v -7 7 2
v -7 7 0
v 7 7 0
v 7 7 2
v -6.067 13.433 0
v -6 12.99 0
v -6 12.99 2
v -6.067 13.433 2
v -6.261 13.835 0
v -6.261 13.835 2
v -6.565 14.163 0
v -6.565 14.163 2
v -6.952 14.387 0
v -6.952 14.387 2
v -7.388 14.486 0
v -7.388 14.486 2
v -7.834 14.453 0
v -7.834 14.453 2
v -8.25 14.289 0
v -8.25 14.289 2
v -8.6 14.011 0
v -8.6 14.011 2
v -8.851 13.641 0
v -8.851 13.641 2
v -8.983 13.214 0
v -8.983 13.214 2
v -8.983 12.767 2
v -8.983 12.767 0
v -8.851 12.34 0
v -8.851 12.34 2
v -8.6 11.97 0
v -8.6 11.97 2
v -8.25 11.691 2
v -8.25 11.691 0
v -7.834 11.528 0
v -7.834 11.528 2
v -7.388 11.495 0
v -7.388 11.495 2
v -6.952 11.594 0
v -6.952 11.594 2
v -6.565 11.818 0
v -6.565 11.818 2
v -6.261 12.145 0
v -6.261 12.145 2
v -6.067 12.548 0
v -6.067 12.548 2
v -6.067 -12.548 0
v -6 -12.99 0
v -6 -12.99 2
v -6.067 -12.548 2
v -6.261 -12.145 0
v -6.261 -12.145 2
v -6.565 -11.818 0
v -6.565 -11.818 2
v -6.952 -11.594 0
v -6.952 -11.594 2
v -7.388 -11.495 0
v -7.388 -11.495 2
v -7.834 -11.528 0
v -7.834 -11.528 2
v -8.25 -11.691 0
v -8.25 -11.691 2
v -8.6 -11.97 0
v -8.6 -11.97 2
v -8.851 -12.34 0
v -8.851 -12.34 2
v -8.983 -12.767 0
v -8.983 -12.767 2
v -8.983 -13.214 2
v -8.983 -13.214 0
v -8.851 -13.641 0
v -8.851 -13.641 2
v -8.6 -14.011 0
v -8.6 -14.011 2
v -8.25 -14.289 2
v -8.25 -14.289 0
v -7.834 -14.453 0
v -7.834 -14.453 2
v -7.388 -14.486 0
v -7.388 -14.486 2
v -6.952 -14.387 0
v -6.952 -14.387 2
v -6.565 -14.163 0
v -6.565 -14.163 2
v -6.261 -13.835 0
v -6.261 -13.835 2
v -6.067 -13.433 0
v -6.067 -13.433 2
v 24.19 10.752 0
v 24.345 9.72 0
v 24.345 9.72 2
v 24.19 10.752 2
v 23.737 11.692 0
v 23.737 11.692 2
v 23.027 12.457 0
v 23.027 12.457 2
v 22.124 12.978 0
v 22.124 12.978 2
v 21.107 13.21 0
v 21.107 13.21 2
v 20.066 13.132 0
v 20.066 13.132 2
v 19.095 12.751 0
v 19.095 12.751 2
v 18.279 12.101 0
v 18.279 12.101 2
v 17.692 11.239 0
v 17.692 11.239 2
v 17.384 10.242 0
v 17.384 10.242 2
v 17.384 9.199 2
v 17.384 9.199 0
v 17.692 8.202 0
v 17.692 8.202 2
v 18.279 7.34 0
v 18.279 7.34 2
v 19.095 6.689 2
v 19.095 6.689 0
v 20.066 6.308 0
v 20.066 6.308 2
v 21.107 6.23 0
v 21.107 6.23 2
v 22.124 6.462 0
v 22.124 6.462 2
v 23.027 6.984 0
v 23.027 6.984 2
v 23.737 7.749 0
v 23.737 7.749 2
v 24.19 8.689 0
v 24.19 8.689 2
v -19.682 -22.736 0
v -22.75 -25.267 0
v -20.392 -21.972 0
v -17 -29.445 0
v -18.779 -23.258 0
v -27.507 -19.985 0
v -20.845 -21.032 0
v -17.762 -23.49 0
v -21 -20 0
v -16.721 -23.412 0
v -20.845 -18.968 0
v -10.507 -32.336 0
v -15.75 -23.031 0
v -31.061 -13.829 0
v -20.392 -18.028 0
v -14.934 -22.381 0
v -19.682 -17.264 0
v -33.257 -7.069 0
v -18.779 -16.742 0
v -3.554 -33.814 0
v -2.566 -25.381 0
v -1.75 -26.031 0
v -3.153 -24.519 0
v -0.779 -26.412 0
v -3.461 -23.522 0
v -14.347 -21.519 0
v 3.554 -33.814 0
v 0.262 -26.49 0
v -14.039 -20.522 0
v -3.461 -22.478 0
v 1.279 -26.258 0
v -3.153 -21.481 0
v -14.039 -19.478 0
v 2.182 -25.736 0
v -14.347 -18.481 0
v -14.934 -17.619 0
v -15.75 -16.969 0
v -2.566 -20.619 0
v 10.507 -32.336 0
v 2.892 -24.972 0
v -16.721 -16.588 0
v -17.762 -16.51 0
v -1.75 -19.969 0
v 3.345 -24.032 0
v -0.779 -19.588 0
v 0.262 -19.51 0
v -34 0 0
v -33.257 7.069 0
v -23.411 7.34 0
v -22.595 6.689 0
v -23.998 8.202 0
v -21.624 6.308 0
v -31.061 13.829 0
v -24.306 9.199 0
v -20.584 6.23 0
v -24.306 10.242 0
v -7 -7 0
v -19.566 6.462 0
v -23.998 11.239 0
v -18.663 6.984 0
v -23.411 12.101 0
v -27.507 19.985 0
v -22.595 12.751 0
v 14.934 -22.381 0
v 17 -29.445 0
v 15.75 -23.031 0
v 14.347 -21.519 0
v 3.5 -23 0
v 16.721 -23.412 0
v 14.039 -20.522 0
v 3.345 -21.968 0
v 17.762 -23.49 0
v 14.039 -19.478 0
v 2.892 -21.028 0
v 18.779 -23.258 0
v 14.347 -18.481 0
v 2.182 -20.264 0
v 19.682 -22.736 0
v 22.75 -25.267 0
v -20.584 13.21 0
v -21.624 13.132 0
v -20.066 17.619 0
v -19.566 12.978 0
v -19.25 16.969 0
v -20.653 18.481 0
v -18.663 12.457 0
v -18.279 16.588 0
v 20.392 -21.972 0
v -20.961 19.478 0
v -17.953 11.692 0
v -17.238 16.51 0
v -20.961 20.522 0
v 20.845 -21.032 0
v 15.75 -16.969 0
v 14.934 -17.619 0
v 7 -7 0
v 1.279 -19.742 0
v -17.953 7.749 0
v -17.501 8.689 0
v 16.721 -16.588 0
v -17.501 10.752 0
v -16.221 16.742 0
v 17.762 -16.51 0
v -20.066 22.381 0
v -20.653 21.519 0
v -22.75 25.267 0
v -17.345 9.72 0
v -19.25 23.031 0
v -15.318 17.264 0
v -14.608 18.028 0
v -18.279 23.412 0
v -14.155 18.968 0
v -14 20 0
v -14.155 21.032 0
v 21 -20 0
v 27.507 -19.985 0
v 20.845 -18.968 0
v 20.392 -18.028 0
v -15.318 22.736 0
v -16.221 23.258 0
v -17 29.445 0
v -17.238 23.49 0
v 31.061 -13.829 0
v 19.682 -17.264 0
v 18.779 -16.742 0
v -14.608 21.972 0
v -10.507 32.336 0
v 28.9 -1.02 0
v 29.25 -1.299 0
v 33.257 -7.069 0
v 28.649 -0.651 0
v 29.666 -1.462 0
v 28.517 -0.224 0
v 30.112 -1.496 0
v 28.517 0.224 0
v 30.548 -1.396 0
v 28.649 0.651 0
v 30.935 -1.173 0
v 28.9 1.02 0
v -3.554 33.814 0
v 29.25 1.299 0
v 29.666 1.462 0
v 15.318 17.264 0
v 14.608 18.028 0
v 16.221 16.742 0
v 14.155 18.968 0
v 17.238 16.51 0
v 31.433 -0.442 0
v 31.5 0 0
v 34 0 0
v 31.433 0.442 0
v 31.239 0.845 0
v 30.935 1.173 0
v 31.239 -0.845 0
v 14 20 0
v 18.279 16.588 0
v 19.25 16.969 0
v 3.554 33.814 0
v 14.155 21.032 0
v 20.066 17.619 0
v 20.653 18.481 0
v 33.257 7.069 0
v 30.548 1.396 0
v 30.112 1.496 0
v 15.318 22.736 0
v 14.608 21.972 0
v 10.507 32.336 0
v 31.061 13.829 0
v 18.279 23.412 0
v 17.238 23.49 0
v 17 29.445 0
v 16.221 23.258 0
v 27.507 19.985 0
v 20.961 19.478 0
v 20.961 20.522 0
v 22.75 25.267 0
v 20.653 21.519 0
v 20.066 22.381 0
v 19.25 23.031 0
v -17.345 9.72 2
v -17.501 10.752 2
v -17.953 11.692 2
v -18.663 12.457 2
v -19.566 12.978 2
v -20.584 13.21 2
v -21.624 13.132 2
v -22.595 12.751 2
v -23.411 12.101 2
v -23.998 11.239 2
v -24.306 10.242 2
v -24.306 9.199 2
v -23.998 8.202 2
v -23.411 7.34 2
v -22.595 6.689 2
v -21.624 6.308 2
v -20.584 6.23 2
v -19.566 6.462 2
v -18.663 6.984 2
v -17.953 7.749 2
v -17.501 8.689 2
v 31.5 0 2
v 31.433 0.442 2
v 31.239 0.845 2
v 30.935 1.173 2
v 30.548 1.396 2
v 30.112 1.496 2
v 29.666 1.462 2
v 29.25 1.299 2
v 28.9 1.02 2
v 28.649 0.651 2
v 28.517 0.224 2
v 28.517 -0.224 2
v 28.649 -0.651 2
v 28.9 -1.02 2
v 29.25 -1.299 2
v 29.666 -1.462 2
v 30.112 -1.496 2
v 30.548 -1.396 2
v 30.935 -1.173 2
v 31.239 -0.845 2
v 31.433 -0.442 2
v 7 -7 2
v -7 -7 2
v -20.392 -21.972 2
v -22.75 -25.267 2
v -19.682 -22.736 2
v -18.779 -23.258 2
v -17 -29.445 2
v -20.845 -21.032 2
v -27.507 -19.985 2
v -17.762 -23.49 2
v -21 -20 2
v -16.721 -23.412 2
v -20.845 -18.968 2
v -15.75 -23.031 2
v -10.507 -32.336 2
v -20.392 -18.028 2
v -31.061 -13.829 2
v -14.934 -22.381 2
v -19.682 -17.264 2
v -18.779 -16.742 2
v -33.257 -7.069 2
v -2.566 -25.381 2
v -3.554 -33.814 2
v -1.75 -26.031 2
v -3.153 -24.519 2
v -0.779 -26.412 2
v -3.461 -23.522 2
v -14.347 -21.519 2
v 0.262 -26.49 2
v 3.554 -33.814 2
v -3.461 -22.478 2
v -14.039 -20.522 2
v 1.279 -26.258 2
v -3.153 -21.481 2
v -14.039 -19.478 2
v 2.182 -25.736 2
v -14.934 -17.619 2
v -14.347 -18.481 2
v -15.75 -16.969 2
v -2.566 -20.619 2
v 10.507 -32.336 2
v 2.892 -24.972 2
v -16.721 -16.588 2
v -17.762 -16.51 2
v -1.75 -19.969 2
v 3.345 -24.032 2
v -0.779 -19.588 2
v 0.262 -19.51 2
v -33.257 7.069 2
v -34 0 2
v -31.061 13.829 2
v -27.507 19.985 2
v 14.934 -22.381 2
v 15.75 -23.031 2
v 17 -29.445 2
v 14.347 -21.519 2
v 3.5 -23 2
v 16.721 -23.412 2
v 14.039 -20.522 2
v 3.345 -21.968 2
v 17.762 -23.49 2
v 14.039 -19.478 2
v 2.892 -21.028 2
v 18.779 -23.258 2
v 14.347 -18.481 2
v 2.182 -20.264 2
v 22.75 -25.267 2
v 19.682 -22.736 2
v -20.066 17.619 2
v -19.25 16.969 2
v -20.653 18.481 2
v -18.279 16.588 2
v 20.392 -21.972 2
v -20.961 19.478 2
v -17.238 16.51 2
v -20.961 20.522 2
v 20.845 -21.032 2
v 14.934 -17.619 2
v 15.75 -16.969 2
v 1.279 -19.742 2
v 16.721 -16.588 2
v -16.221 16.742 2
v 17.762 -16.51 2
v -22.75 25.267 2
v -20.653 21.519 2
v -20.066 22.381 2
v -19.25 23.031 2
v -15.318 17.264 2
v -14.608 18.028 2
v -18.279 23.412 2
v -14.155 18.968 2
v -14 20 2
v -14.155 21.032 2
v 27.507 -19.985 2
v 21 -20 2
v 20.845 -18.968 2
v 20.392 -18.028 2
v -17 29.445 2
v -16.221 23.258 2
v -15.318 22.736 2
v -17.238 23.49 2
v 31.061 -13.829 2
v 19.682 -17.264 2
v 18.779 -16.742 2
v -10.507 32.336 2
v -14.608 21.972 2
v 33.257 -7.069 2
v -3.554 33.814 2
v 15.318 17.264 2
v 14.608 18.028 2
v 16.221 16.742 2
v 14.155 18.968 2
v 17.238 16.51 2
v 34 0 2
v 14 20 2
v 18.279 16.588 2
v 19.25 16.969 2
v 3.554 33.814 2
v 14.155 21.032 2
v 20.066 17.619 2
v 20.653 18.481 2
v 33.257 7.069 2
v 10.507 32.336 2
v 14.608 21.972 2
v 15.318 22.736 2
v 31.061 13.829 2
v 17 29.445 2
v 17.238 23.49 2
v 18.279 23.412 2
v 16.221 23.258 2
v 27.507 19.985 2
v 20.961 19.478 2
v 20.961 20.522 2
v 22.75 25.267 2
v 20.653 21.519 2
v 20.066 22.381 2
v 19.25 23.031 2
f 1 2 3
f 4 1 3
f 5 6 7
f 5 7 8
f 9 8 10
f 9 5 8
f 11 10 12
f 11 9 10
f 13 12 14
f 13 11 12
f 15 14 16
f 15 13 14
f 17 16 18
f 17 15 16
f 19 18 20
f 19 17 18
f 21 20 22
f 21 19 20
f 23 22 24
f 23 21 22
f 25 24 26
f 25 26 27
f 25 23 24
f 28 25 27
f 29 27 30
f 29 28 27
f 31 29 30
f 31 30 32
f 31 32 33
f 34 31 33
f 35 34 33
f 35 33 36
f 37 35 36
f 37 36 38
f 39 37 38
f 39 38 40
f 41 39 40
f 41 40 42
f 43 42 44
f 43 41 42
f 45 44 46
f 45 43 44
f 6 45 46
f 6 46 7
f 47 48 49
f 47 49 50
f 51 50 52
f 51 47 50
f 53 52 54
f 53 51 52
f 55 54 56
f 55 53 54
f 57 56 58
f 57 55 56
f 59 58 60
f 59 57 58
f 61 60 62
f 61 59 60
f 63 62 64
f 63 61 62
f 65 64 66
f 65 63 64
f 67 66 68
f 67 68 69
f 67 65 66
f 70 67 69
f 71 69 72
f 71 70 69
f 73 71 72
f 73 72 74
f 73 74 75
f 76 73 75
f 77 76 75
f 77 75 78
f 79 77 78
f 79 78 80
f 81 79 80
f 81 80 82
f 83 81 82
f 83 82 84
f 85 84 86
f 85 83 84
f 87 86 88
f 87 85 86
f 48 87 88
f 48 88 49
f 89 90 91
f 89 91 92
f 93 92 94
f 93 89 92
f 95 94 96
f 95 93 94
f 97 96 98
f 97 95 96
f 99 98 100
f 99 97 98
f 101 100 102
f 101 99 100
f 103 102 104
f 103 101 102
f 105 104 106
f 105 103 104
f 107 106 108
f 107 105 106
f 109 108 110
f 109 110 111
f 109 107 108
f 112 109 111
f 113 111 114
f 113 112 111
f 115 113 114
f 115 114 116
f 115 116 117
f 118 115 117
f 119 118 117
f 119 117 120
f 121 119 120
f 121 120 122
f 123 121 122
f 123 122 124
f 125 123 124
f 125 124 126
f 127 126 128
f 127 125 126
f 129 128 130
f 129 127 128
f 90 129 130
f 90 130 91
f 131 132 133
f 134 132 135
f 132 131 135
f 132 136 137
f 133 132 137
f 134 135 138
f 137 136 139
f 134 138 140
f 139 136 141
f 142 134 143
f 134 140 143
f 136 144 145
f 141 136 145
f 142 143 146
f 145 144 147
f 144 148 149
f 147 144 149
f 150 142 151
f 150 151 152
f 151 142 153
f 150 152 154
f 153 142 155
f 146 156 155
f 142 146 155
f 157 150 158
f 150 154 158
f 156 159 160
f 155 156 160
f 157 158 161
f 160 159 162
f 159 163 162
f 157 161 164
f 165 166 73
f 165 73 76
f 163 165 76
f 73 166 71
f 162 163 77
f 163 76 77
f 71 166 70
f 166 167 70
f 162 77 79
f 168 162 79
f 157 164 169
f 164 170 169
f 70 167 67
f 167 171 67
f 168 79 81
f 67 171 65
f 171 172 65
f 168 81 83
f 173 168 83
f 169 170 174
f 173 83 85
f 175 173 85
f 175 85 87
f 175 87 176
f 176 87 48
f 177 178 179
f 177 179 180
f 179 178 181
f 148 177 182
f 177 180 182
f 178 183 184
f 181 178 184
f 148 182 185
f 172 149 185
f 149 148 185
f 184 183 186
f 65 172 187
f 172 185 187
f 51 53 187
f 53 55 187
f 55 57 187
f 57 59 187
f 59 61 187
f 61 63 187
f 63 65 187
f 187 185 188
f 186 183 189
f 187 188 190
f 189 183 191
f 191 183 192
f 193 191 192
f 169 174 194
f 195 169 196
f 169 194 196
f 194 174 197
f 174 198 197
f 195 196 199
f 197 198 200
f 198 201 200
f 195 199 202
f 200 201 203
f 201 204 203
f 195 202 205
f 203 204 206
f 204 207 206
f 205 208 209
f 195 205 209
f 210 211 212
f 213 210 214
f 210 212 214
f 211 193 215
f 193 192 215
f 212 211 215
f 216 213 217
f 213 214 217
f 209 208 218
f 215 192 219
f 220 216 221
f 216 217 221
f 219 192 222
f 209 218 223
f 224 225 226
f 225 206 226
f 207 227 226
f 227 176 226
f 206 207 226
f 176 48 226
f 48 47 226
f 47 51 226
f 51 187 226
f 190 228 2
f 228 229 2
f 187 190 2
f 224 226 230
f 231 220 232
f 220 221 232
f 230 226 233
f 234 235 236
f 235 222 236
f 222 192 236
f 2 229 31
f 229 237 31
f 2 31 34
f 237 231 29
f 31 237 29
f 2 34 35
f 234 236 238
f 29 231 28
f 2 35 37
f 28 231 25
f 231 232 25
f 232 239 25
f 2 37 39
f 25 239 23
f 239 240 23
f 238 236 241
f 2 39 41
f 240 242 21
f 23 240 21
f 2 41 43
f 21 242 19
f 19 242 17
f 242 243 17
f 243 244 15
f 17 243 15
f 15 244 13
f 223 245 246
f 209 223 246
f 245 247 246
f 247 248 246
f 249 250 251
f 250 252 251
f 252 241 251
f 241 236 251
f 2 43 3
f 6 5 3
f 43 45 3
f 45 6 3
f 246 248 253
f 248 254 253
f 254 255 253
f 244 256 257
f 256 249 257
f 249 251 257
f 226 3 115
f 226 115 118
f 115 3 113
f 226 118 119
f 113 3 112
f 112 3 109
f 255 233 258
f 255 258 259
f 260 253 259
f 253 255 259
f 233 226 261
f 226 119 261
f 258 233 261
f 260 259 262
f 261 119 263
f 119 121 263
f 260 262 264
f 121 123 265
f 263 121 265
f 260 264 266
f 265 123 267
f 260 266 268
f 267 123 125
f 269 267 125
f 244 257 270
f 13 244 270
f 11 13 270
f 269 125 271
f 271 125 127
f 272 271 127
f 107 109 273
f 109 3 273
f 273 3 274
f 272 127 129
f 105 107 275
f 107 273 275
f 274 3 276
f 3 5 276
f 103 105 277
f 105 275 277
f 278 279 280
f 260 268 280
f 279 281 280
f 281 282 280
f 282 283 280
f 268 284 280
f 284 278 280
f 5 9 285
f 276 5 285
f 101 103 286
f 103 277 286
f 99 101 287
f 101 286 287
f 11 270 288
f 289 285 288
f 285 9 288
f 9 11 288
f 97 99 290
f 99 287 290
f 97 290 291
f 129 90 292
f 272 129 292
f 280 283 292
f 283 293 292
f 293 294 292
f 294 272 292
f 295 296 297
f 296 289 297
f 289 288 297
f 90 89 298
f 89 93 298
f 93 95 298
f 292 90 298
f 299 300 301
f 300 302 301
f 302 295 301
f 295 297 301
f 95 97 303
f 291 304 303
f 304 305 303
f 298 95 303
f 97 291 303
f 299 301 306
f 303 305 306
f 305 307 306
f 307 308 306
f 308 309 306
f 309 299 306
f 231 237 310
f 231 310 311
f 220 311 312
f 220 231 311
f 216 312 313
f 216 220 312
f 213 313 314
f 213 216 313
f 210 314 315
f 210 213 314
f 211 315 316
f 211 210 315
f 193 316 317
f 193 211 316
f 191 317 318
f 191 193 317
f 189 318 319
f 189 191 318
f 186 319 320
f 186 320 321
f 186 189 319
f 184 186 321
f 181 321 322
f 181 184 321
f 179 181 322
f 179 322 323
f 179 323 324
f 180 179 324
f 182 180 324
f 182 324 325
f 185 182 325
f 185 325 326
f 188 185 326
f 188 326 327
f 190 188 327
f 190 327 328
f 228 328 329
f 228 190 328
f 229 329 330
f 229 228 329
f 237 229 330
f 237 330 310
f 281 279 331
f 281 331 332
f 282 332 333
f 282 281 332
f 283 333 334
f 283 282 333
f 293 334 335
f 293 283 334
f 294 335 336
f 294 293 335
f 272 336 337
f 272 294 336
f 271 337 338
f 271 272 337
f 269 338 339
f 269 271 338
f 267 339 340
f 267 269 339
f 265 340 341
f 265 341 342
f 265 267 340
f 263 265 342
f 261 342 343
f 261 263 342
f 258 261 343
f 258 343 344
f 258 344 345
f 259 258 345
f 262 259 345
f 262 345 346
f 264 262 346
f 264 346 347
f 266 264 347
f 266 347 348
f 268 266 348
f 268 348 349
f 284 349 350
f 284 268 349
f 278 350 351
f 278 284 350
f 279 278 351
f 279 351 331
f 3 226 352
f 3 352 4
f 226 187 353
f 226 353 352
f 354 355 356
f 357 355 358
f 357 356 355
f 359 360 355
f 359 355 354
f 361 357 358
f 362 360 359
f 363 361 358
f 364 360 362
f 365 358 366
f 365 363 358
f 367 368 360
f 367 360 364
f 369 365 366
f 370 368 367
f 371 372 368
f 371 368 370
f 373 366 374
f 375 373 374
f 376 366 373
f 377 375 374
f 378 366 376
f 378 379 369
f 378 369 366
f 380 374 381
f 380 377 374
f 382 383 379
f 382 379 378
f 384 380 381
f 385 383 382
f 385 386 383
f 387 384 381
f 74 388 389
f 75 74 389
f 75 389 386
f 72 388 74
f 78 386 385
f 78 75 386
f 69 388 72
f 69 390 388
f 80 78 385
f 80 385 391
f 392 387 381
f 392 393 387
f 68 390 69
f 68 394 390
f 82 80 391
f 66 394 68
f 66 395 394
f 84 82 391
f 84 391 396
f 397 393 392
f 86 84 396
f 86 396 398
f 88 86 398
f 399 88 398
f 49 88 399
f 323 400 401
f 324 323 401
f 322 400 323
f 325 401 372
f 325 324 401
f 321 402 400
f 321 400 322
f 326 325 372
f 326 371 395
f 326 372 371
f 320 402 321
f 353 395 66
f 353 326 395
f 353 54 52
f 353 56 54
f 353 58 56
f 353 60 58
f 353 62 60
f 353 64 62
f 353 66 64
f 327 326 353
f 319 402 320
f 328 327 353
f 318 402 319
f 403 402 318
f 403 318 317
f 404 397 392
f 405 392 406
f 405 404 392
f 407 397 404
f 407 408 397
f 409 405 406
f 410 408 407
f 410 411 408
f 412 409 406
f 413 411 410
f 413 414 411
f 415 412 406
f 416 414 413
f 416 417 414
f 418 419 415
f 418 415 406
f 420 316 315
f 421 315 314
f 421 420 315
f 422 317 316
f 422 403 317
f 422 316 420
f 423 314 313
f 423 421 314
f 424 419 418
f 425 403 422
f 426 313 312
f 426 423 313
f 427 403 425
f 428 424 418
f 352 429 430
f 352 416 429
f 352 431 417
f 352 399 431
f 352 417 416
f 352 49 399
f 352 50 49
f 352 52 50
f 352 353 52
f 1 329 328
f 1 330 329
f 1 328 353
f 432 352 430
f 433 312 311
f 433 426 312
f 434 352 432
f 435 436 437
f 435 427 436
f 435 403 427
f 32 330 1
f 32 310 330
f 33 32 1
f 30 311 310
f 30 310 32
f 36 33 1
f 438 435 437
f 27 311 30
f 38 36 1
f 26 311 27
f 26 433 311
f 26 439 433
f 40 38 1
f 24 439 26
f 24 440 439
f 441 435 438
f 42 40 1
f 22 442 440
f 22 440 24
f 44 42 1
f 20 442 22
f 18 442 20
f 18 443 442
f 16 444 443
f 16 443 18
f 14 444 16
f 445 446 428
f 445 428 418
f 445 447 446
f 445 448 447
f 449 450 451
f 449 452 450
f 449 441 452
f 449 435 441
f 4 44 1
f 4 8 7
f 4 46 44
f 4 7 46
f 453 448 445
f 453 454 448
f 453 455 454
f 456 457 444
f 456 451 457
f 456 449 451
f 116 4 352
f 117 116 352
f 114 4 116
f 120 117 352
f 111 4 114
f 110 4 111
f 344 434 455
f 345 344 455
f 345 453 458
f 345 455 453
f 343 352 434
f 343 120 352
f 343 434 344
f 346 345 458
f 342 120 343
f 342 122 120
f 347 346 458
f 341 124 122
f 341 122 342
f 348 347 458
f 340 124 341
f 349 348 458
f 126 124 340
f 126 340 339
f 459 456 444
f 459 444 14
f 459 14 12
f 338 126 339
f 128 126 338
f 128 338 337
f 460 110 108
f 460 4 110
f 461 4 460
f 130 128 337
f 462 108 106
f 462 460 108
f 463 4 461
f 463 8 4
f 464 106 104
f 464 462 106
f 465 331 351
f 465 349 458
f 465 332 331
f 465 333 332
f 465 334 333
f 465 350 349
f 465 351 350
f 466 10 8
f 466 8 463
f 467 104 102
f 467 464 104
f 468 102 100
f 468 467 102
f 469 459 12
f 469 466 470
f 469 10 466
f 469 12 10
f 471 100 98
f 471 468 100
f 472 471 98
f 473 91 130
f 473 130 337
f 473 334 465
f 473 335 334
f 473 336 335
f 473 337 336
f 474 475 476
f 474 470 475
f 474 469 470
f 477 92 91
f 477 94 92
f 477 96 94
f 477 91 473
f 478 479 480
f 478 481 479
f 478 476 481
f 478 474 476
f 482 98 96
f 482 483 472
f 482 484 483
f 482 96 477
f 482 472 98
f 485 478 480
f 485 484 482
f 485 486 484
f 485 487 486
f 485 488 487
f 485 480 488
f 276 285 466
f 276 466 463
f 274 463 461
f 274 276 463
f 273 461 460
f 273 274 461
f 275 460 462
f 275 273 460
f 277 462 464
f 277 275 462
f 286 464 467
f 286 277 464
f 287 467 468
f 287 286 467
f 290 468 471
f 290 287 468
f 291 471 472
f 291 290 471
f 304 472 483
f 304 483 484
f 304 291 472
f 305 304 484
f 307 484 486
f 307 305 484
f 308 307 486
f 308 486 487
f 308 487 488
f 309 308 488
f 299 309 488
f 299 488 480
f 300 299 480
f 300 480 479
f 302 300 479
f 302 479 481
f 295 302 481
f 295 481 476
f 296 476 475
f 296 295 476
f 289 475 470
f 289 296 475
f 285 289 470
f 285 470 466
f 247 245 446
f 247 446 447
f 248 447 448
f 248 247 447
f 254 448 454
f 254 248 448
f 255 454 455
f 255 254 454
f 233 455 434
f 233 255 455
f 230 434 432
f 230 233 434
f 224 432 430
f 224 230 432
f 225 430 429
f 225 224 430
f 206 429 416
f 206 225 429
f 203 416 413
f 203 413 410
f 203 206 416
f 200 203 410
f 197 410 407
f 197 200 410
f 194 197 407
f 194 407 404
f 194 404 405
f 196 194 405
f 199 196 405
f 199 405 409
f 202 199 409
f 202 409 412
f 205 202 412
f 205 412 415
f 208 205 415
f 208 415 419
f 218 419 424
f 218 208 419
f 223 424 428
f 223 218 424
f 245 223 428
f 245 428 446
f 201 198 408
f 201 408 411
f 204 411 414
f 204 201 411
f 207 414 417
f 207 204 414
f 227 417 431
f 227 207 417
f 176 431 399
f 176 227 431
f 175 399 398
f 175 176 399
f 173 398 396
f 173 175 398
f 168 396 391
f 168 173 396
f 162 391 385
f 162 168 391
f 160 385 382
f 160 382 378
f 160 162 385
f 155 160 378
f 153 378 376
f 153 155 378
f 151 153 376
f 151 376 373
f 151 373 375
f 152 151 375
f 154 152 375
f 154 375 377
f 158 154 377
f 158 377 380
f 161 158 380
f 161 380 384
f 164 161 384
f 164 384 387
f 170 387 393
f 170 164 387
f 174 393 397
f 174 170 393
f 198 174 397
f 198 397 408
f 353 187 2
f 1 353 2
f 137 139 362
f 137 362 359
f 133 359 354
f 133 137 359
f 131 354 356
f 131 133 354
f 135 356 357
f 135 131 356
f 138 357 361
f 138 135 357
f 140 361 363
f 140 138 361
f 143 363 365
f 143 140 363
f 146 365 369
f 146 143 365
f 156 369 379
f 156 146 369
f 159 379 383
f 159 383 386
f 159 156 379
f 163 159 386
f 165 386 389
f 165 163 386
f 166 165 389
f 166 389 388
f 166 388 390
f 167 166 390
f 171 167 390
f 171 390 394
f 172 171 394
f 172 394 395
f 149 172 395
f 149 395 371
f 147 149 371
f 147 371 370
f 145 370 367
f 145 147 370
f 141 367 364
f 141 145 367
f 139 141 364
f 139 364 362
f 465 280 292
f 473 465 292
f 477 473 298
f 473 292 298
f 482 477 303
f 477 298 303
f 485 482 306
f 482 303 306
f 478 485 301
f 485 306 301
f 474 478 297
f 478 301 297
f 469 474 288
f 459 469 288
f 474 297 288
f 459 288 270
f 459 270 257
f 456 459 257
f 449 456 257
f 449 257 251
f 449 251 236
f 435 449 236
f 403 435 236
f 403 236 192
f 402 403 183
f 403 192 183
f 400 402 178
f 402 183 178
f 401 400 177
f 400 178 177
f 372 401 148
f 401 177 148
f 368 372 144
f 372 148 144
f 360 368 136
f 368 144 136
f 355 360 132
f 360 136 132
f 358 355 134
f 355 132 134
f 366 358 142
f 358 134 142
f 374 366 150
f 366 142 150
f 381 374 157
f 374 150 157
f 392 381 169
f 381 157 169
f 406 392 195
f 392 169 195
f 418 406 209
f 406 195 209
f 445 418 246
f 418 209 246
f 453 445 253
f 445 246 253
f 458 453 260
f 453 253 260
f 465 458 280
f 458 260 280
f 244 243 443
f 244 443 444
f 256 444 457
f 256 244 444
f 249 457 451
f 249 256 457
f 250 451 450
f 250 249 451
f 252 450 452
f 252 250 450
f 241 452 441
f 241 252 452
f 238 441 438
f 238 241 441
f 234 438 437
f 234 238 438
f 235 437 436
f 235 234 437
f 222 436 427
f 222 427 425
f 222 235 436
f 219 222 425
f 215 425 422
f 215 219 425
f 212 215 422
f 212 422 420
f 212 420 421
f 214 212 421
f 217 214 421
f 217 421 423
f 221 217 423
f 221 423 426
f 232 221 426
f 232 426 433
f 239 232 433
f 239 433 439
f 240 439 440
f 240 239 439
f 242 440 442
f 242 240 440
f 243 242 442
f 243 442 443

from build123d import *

# Parameters (mm, degrees)
SKETCH1_R           = 34
SKETCH1_R_2         = 1.5
SKETCH1_R_3         = 3.5
SKETCH1_W           = 14
SKETCH1_H           = 14
BOSS_EXTRUDE1_DEPTH = 2


with BuildPart() as part:
    # Sketch1 → Boss-Extrude1 (new body)
    with BuildSketch(Plane.XY):
        Circle(SKETCH1_R)
        with Locations((30, 0)):
            Circle(SKETCH1_R_2, mode=Mode.SUBTRACT)
        with Locations((-7.5, -12.990381057)):
            Circle(SKETCH1_R_2, mode=Mode.SUBTRACT)
        with Locations((-7.5, 12.990381057)):
            Circle(SKETCH1_R_2, mode=Mode.SUBTRACT)
        with Locations((-17.5, 20)):
            Circle(SKETCH1_R_3, mode=Mode.SUBTRACT)
        with Locations(Location((17.5, 20, 0), (0, 0, 180))):
            Circle(SKETCH1_R_3, mode=Mode.SUBTRACT)
        with Locations(Location((-17.5, -20, 0), (0, 0, 180))):
            Circle(SKETCH1_R_3, mode=Mode.SUBTRACT)
        with Locations((17.5, -20)):
            Circle(SKETCH1_R_3, mode=Mode.SUBTRACT)
        with Locations((20.845079102, 9.72022002)):
            Circle(SKETCH1_R_3, mode=Mode.SUBTRACT)
        with Locations((0, -23)):
            Circle(SKETCH1_R_3, mode=Mode.SUBTRACT)
        with Locations((-20.845079102, 9.72022002)):
            Circle(SKETCH1_R_3, mode=Mode.SUBTRACT)
        Rectangle(SKETCH1_W, SKETCH1_H, mode=Mode.SUBTRACT)
    extrude(amount=BOSS_EXTRUDE1_DEPTH)


solid = part.part
